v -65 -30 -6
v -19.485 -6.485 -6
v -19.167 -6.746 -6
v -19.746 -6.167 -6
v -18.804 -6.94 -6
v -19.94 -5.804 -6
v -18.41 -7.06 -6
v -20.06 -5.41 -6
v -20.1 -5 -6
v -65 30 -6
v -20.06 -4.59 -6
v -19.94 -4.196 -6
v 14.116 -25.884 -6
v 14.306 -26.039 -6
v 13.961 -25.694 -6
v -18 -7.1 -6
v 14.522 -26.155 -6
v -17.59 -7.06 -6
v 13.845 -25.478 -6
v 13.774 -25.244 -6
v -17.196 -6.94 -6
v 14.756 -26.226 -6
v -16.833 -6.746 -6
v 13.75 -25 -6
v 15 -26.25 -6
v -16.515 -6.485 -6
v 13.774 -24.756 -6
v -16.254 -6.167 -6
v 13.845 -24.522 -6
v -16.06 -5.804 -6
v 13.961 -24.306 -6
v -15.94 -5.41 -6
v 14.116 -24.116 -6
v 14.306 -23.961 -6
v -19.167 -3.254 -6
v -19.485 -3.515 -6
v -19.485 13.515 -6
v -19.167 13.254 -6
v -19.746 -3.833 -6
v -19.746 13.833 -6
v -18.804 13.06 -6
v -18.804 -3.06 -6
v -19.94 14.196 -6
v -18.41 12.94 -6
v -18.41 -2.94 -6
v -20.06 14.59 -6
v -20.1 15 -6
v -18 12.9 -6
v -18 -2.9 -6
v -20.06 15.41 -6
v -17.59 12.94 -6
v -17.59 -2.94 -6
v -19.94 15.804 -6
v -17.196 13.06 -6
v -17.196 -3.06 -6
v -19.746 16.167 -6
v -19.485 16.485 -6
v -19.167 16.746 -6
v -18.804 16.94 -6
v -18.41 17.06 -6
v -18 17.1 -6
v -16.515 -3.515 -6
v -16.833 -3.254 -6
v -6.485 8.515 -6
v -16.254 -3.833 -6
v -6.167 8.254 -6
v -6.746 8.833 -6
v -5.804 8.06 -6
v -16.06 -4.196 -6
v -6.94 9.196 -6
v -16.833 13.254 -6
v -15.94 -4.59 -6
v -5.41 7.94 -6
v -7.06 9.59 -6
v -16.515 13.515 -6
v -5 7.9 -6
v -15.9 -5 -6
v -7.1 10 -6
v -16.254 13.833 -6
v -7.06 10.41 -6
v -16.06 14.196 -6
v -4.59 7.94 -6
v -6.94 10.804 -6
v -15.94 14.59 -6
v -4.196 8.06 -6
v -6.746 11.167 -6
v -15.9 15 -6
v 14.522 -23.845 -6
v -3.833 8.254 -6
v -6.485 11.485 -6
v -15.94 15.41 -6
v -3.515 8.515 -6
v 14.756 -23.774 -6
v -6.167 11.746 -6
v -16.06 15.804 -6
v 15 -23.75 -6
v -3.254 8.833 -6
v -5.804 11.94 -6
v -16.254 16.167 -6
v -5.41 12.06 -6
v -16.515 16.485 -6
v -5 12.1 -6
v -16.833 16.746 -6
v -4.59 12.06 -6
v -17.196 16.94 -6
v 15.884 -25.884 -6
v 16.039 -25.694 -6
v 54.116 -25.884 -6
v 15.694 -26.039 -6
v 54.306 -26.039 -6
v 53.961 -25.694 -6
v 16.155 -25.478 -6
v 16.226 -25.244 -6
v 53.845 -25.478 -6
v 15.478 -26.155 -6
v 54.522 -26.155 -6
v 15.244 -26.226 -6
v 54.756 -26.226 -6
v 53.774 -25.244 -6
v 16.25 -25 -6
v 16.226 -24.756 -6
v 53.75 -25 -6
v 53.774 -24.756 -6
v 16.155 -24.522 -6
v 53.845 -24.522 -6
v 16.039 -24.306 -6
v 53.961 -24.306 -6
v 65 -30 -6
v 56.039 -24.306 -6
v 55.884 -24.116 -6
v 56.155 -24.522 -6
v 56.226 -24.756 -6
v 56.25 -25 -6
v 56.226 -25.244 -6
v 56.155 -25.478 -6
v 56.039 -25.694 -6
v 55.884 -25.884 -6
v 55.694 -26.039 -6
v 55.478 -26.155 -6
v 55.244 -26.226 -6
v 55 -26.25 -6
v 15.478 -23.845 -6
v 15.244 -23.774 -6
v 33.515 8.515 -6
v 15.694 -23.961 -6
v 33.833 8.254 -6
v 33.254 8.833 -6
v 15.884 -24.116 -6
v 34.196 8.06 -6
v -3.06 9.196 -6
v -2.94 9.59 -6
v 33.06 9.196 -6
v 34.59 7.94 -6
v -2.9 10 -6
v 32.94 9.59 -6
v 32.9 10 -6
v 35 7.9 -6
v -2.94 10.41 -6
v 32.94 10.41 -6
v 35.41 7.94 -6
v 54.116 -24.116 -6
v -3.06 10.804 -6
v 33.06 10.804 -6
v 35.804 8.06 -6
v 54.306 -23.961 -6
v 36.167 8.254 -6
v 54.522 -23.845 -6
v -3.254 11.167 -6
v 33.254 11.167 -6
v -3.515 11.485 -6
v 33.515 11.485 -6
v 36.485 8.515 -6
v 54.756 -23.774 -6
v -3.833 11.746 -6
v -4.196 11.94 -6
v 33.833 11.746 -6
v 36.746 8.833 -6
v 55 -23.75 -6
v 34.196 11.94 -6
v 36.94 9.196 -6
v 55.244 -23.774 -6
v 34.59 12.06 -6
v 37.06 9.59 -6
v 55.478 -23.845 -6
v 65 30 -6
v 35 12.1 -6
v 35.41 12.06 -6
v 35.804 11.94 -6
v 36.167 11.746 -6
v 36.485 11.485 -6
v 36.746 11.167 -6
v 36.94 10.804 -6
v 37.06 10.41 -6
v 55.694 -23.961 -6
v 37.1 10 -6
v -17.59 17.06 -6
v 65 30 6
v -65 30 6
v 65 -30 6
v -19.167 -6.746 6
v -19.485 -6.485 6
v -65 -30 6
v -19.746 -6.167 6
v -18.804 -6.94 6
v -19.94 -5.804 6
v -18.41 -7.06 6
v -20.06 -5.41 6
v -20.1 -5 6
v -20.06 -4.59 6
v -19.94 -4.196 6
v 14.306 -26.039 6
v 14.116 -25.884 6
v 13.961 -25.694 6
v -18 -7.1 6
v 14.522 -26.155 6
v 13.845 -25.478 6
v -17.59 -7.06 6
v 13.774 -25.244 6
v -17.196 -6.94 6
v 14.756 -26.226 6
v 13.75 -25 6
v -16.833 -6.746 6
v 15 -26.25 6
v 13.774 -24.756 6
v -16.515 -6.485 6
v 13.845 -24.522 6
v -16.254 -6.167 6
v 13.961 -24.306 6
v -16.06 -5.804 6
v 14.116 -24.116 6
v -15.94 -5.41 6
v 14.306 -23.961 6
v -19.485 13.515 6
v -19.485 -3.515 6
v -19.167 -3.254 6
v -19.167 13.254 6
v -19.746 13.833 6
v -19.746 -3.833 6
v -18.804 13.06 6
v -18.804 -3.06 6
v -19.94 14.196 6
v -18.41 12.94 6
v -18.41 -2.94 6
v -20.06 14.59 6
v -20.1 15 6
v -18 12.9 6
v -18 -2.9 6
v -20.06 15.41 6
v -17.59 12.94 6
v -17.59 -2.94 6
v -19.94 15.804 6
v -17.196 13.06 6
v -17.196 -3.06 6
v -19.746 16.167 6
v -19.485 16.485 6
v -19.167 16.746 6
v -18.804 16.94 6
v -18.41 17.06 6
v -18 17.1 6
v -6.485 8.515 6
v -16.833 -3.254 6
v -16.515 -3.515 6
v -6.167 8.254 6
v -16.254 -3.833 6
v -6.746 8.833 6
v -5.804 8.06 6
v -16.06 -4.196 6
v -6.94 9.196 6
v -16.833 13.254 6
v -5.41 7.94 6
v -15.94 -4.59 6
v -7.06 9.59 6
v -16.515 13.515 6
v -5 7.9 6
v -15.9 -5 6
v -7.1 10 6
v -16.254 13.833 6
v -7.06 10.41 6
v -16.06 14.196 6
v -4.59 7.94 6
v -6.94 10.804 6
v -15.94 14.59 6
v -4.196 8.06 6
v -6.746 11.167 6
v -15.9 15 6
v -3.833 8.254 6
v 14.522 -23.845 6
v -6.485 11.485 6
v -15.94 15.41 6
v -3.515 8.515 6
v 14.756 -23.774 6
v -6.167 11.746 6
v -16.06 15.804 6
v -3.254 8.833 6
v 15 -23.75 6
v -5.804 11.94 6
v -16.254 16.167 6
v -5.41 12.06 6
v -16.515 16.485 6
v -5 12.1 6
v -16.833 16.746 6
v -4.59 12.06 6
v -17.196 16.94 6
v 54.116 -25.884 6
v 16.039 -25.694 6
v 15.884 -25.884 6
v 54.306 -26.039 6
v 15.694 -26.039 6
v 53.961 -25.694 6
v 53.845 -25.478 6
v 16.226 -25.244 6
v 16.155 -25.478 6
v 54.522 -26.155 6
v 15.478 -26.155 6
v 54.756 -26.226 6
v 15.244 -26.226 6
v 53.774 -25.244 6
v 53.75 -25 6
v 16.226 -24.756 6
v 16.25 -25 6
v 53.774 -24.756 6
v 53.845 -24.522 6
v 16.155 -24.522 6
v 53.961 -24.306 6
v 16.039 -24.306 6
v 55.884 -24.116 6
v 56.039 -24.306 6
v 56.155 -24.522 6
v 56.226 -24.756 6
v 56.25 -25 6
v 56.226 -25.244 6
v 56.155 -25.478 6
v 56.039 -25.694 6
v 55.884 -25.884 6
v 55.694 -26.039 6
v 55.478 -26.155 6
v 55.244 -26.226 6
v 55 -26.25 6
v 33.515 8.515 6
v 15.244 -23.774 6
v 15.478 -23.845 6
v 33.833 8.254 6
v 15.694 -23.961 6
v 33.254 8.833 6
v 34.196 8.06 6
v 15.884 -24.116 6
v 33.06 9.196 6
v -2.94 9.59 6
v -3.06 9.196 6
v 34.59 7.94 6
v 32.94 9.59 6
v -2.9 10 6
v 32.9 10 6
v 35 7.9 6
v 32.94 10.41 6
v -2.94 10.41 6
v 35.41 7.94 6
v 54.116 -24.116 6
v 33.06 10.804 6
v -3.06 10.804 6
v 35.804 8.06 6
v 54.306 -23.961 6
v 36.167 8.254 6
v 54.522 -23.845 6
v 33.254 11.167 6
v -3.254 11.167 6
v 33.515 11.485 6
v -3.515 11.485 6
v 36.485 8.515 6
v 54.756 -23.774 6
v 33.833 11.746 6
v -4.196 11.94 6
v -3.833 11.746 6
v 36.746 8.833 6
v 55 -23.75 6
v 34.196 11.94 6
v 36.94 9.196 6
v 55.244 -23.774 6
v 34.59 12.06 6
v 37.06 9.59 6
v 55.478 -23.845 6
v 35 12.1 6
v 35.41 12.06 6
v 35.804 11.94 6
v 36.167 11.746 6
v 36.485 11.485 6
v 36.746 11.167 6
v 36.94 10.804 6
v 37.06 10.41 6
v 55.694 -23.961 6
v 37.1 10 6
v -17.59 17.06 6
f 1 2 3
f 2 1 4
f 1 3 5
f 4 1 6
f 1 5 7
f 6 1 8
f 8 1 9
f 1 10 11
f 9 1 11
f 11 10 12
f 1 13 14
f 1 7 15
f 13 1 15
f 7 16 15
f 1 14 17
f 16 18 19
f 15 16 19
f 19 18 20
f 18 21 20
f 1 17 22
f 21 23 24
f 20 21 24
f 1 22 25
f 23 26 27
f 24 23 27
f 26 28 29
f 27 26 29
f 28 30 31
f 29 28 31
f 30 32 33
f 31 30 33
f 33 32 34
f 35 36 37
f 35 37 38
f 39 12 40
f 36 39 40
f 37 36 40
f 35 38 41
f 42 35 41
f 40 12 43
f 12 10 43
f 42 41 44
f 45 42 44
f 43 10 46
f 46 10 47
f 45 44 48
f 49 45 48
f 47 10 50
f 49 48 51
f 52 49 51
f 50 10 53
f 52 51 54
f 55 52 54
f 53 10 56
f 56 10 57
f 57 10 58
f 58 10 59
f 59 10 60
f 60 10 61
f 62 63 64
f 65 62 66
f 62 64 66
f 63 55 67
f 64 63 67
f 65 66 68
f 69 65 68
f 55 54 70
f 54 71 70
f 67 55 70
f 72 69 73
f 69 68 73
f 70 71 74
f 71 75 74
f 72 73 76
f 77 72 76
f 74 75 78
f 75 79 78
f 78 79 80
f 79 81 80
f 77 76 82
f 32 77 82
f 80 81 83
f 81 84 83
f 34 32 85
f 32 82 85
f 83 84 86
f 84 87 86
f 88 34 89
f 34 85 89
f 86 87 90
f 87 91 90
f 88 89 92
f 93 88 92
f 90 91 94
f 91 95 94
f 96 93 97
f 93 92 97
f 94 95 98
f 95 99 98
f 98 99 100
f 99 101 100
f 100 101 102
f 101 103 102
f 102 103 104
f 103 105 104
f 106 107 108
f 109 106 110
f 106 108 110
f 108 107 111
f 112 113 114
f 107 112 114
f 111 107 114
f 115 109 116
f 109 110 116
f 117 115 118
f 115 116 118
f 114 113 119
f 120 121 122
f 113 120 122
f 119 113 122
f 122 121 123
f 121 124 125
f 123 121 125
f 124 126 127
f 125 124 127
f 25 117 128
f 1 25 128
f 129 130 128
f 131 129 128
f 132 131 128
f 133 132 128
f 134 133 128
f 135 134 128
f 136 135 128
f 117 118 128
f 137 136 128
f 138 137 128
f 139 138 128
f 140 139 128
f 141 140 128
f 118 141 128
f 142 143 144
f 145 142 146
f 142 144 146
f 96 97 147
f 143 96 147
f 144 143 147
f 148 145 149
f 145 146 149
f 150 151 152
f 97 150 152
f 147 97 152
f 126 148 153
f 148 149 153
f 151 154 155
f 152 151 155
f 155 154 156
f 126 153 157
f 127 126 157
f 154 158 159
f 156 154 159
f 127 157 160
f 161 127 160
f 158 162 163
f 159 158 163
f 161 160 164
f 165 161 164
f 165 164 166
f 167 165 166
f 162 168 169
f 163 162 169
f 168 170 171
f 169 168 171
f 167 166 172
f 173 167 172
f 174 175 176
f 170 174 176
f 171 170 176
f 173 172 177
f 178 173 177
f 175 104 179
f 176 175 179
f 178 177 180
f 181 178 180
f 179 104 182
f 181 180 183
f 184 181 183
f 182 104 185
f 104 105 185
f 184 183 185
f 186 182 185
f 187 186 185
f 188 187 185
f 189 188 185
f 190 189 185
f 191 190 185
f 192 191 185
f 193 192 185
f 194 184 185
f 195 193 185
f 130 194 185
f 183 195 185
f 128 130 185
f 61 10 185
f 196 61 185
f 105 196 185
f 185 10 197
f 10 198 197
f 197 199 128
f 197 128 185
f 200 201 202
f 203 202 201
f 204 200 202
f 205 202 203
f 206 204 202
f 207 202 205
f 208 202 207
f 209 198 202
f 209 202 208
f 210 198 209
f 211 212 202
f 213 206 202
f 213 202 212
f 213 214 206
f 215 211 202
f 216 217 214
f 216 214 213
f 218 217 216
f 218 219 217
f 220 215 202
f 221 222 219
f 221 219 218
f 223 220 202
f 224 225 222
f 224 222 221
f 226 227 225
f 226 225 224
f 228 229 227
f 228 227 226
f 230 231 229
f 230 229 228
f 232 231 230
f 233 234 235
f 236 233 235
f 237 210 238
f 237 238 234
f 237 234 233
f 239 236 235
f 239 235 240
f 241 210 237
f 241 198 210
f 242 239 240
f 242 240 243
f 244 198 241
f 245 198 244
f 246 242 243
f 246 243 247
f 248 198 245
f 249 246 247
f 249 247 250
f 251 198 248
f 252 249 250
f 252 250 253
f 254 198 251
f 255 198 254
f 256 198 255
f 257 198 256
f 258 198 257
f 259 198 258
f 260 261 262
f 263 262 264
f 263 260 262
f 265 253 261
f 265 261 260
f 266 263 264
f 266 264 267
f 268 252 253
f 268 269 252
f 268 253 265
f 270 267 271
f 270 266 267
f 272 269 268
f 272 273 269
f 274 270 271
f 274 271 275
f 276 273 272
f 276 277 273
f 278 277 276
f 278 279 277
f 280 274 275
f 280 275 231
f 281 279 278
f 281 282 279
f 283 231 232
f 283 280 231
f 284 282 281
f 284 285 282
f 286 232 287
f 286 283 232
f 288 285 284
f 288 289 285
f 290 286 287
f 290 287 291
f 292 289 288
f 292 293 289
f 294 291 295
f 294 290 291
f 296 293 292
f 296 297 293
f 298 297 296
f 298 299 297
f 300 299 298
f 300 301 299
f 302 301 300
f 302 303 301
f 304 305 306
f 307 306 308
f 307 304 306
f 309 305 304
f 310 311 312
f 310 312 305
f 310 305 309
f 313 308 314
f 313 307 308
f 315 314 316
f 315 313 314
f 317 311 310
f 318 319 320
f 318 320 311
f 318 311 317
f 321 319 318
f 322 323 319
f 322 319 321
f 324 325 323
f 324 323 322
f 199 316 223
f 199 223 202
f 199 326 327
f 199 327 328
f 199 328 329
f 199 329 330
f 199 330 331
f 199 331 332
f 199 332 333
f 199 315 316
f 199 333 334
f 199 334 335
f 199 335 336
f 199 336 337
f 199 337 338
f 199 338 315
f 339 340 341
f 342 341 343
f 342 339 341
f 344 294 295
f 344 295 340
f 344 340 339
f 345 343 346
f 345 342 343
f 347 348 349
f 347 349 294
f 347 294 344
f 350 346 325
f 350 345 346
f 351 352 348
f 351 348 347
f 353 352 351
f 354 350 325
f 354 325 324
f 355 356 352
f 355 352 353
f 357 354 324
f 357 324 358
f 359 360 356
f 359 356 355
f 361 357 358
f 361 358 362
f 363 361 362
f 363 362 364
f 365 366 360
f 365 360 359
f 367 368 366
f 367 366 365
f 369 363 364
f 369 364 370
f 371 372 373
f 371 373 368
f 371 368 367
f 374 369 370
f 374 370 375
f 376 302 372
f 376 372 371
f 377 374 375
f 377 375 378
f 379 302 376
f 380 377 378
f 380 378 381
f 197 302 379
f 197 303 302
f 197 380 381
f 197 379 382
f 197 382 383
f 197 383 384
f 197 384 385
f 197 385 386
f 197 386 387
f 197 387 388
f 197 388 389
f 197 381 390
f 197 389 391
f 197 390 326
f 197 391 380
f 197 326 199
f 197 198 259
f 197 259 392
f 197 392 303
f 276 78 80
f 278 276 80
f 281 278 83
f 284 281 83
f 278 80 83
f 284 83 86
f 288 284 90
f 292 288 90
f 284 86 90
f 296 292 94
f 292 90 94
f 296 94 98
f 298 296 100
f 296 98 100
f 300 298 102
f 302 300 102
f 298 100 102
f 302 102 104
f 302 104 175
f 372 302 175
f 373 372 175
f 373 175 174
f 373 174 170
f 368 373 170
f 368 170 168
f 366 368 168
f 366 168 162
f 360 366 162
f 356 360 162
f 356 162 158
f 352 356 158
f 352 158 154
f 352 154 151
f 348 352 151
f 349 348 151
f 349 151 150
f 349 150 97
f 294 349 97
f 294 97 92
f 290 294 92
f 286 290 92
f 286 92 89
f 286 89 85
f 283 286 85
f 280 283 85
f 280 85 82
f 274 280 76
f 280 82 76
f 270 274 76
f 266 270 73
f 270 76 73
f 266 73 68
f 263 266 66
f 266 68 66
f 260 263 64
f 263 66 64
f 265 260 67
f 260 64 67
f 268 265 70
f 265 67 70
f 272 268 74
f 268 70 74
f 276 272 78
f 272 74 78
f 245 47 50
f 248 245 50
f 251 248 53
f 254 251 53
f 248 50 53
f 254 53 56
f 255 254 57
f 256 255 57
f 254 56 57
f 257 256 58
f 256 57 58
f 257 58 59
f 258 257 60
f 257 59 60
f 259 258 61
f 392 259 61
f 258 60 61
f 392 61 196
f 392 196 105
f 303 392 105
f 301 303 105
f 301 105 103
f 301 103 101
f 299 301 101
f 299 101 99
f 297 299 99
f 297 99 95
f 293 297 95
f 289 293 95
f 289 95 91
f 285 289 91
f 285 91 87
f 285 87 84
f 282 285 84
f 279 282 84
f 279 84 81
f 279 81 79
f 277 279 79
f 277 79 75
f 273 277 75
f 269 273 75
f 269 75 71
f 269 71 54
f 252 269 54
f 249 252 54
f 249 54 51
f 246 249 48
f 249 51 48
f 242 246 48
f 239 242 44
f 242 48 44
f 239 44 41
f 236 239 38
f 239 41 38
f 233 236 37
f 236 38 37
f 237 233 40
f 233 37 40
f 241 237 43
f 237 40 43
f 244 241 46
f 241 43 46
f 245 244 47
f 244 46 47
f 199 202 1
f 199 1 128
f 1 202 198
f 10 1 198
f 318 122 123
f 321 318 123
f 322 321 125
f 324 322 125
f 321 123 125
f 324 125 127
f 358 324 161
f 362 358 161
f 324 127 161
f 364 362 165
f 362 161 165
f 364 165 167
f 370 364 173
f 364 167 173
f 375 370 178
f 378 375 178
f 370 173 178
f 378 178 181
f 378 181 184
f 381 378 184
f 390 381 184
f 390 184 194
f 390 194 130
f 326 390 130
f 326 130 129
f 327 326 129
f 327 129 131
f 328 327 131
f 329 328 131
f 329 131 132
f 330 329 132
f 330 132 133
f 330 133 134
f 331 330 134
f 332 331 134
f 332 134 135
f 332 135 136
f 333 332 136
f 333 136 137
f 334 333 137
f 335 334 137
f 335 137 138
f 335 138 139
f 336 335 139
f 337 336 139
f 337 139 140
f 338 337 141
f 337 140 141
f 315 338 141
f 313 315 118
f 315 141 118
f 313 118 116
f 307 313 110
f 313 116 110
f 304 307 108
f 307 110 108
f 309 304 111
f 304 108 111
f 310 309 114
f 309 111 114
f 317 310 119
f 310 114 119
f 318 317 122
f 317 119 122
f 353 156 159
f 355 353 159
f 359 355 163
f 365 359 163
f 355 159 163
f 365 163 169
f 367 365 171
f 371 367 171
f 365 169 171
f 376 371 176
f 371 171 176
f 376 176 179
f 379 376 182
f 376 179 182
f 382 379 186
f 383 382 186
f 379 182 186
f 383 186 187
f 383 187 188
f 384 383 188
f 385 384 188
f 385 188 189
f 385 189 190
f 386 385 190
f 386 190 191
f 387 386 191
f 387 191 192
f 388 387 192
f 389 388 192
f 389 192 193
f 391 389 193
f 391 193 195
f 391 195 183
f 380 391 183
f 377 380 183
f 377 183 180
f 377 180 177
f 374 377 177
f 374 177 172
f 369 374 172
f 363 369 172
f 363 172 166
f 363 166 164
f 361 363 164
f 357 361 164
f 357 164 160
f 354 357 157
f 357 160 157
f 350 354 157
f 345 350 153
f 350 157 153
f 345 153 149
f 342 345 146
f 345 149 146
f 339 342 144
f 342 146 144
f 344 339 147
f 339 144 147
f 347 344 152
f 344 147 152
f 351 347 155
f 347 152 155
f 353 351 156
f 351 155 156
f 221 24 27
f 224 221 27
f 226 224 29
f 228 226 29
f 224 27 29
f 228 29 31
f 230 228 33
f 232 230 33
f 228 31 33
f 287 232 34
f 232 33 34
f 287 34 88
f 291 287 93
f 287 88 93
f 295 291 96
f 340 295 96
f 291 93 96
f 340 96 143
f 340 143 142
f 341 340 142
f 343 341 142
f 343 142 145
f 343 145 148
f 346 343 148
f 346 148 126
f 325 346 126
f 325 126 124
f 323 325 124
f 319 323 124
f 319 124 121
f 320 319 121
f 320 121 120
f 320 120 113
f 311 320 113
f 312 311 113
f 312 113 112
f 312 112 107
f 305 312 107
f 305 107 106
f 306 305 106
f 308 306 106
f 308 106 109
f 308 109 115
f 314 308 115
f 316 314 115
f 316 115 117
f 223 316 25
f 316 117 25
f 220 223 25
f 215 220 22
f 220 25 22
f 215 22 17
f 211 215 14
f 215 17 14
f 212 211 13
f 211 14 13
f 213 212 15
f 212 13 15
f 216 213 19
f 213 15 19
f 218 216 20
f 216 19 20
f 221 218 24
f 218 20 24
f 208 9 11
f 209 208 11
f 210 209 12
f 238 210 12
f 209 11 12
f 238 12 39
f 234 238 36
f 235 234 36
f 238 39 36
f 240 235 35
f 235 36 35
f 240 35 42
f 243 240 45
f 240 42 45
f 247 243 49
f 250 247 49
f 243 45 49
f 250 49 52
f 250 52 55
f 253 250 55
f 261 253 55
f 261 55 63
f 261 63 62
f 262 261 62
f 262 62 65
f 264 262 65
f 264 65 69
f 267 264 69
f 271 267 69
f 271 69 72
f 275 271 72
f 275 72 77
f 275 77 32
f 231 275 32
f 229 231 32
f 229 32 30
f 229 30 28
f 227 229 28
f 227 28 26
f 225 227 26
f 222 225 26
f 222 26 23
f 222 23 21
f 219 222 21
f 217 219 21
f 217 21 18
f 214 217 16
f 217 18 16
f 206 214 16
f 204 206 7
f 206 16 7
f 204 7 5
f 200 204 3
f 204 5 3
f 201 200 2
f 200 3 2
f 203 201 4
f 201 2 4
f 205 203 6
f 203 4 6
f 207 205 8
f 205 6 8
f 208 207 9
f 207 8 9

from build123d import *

# Parameters (mm, degrees)
SKETCH1_W             = 130
SKETCH1_H             = 60
BOSS_EXTRUDE1_DEPTH   = 6
M5X0_8_TAPPED_HOLE1_D = 4.2
M3X0_5_TAPPED_HOLE1_D = 2.5


with BuildPart() as part:
    # Sketch1 → Boss-Extrude1 (new body, symmetric)
    with BuildSketch(Plane.XY):
        Rectangle(SKETCH1_W, SKETCH1_H)
    extrude(amount=BOSS_EXTRUDE1_DEPTH, both=True)

    # M5x0.8 Tapped Hole1 (through all)
    with Locations(Plane.XY.offset(6)):
        with Locations((-18, 15), (-18, -5), (-5, 10), (35, 10)):
            Hole(M5X0_8_TAPPED_HOLE1_D / 2)

    # M3x0.5 Tapped Hole1 (through all)
    with Locations(Plane.XY.offset(6)):
        with Locations((15, -25), (55, -25)):
            Hole(M3X0_5_TAPPED_HOLE1_D / 2)


solid = part.part
